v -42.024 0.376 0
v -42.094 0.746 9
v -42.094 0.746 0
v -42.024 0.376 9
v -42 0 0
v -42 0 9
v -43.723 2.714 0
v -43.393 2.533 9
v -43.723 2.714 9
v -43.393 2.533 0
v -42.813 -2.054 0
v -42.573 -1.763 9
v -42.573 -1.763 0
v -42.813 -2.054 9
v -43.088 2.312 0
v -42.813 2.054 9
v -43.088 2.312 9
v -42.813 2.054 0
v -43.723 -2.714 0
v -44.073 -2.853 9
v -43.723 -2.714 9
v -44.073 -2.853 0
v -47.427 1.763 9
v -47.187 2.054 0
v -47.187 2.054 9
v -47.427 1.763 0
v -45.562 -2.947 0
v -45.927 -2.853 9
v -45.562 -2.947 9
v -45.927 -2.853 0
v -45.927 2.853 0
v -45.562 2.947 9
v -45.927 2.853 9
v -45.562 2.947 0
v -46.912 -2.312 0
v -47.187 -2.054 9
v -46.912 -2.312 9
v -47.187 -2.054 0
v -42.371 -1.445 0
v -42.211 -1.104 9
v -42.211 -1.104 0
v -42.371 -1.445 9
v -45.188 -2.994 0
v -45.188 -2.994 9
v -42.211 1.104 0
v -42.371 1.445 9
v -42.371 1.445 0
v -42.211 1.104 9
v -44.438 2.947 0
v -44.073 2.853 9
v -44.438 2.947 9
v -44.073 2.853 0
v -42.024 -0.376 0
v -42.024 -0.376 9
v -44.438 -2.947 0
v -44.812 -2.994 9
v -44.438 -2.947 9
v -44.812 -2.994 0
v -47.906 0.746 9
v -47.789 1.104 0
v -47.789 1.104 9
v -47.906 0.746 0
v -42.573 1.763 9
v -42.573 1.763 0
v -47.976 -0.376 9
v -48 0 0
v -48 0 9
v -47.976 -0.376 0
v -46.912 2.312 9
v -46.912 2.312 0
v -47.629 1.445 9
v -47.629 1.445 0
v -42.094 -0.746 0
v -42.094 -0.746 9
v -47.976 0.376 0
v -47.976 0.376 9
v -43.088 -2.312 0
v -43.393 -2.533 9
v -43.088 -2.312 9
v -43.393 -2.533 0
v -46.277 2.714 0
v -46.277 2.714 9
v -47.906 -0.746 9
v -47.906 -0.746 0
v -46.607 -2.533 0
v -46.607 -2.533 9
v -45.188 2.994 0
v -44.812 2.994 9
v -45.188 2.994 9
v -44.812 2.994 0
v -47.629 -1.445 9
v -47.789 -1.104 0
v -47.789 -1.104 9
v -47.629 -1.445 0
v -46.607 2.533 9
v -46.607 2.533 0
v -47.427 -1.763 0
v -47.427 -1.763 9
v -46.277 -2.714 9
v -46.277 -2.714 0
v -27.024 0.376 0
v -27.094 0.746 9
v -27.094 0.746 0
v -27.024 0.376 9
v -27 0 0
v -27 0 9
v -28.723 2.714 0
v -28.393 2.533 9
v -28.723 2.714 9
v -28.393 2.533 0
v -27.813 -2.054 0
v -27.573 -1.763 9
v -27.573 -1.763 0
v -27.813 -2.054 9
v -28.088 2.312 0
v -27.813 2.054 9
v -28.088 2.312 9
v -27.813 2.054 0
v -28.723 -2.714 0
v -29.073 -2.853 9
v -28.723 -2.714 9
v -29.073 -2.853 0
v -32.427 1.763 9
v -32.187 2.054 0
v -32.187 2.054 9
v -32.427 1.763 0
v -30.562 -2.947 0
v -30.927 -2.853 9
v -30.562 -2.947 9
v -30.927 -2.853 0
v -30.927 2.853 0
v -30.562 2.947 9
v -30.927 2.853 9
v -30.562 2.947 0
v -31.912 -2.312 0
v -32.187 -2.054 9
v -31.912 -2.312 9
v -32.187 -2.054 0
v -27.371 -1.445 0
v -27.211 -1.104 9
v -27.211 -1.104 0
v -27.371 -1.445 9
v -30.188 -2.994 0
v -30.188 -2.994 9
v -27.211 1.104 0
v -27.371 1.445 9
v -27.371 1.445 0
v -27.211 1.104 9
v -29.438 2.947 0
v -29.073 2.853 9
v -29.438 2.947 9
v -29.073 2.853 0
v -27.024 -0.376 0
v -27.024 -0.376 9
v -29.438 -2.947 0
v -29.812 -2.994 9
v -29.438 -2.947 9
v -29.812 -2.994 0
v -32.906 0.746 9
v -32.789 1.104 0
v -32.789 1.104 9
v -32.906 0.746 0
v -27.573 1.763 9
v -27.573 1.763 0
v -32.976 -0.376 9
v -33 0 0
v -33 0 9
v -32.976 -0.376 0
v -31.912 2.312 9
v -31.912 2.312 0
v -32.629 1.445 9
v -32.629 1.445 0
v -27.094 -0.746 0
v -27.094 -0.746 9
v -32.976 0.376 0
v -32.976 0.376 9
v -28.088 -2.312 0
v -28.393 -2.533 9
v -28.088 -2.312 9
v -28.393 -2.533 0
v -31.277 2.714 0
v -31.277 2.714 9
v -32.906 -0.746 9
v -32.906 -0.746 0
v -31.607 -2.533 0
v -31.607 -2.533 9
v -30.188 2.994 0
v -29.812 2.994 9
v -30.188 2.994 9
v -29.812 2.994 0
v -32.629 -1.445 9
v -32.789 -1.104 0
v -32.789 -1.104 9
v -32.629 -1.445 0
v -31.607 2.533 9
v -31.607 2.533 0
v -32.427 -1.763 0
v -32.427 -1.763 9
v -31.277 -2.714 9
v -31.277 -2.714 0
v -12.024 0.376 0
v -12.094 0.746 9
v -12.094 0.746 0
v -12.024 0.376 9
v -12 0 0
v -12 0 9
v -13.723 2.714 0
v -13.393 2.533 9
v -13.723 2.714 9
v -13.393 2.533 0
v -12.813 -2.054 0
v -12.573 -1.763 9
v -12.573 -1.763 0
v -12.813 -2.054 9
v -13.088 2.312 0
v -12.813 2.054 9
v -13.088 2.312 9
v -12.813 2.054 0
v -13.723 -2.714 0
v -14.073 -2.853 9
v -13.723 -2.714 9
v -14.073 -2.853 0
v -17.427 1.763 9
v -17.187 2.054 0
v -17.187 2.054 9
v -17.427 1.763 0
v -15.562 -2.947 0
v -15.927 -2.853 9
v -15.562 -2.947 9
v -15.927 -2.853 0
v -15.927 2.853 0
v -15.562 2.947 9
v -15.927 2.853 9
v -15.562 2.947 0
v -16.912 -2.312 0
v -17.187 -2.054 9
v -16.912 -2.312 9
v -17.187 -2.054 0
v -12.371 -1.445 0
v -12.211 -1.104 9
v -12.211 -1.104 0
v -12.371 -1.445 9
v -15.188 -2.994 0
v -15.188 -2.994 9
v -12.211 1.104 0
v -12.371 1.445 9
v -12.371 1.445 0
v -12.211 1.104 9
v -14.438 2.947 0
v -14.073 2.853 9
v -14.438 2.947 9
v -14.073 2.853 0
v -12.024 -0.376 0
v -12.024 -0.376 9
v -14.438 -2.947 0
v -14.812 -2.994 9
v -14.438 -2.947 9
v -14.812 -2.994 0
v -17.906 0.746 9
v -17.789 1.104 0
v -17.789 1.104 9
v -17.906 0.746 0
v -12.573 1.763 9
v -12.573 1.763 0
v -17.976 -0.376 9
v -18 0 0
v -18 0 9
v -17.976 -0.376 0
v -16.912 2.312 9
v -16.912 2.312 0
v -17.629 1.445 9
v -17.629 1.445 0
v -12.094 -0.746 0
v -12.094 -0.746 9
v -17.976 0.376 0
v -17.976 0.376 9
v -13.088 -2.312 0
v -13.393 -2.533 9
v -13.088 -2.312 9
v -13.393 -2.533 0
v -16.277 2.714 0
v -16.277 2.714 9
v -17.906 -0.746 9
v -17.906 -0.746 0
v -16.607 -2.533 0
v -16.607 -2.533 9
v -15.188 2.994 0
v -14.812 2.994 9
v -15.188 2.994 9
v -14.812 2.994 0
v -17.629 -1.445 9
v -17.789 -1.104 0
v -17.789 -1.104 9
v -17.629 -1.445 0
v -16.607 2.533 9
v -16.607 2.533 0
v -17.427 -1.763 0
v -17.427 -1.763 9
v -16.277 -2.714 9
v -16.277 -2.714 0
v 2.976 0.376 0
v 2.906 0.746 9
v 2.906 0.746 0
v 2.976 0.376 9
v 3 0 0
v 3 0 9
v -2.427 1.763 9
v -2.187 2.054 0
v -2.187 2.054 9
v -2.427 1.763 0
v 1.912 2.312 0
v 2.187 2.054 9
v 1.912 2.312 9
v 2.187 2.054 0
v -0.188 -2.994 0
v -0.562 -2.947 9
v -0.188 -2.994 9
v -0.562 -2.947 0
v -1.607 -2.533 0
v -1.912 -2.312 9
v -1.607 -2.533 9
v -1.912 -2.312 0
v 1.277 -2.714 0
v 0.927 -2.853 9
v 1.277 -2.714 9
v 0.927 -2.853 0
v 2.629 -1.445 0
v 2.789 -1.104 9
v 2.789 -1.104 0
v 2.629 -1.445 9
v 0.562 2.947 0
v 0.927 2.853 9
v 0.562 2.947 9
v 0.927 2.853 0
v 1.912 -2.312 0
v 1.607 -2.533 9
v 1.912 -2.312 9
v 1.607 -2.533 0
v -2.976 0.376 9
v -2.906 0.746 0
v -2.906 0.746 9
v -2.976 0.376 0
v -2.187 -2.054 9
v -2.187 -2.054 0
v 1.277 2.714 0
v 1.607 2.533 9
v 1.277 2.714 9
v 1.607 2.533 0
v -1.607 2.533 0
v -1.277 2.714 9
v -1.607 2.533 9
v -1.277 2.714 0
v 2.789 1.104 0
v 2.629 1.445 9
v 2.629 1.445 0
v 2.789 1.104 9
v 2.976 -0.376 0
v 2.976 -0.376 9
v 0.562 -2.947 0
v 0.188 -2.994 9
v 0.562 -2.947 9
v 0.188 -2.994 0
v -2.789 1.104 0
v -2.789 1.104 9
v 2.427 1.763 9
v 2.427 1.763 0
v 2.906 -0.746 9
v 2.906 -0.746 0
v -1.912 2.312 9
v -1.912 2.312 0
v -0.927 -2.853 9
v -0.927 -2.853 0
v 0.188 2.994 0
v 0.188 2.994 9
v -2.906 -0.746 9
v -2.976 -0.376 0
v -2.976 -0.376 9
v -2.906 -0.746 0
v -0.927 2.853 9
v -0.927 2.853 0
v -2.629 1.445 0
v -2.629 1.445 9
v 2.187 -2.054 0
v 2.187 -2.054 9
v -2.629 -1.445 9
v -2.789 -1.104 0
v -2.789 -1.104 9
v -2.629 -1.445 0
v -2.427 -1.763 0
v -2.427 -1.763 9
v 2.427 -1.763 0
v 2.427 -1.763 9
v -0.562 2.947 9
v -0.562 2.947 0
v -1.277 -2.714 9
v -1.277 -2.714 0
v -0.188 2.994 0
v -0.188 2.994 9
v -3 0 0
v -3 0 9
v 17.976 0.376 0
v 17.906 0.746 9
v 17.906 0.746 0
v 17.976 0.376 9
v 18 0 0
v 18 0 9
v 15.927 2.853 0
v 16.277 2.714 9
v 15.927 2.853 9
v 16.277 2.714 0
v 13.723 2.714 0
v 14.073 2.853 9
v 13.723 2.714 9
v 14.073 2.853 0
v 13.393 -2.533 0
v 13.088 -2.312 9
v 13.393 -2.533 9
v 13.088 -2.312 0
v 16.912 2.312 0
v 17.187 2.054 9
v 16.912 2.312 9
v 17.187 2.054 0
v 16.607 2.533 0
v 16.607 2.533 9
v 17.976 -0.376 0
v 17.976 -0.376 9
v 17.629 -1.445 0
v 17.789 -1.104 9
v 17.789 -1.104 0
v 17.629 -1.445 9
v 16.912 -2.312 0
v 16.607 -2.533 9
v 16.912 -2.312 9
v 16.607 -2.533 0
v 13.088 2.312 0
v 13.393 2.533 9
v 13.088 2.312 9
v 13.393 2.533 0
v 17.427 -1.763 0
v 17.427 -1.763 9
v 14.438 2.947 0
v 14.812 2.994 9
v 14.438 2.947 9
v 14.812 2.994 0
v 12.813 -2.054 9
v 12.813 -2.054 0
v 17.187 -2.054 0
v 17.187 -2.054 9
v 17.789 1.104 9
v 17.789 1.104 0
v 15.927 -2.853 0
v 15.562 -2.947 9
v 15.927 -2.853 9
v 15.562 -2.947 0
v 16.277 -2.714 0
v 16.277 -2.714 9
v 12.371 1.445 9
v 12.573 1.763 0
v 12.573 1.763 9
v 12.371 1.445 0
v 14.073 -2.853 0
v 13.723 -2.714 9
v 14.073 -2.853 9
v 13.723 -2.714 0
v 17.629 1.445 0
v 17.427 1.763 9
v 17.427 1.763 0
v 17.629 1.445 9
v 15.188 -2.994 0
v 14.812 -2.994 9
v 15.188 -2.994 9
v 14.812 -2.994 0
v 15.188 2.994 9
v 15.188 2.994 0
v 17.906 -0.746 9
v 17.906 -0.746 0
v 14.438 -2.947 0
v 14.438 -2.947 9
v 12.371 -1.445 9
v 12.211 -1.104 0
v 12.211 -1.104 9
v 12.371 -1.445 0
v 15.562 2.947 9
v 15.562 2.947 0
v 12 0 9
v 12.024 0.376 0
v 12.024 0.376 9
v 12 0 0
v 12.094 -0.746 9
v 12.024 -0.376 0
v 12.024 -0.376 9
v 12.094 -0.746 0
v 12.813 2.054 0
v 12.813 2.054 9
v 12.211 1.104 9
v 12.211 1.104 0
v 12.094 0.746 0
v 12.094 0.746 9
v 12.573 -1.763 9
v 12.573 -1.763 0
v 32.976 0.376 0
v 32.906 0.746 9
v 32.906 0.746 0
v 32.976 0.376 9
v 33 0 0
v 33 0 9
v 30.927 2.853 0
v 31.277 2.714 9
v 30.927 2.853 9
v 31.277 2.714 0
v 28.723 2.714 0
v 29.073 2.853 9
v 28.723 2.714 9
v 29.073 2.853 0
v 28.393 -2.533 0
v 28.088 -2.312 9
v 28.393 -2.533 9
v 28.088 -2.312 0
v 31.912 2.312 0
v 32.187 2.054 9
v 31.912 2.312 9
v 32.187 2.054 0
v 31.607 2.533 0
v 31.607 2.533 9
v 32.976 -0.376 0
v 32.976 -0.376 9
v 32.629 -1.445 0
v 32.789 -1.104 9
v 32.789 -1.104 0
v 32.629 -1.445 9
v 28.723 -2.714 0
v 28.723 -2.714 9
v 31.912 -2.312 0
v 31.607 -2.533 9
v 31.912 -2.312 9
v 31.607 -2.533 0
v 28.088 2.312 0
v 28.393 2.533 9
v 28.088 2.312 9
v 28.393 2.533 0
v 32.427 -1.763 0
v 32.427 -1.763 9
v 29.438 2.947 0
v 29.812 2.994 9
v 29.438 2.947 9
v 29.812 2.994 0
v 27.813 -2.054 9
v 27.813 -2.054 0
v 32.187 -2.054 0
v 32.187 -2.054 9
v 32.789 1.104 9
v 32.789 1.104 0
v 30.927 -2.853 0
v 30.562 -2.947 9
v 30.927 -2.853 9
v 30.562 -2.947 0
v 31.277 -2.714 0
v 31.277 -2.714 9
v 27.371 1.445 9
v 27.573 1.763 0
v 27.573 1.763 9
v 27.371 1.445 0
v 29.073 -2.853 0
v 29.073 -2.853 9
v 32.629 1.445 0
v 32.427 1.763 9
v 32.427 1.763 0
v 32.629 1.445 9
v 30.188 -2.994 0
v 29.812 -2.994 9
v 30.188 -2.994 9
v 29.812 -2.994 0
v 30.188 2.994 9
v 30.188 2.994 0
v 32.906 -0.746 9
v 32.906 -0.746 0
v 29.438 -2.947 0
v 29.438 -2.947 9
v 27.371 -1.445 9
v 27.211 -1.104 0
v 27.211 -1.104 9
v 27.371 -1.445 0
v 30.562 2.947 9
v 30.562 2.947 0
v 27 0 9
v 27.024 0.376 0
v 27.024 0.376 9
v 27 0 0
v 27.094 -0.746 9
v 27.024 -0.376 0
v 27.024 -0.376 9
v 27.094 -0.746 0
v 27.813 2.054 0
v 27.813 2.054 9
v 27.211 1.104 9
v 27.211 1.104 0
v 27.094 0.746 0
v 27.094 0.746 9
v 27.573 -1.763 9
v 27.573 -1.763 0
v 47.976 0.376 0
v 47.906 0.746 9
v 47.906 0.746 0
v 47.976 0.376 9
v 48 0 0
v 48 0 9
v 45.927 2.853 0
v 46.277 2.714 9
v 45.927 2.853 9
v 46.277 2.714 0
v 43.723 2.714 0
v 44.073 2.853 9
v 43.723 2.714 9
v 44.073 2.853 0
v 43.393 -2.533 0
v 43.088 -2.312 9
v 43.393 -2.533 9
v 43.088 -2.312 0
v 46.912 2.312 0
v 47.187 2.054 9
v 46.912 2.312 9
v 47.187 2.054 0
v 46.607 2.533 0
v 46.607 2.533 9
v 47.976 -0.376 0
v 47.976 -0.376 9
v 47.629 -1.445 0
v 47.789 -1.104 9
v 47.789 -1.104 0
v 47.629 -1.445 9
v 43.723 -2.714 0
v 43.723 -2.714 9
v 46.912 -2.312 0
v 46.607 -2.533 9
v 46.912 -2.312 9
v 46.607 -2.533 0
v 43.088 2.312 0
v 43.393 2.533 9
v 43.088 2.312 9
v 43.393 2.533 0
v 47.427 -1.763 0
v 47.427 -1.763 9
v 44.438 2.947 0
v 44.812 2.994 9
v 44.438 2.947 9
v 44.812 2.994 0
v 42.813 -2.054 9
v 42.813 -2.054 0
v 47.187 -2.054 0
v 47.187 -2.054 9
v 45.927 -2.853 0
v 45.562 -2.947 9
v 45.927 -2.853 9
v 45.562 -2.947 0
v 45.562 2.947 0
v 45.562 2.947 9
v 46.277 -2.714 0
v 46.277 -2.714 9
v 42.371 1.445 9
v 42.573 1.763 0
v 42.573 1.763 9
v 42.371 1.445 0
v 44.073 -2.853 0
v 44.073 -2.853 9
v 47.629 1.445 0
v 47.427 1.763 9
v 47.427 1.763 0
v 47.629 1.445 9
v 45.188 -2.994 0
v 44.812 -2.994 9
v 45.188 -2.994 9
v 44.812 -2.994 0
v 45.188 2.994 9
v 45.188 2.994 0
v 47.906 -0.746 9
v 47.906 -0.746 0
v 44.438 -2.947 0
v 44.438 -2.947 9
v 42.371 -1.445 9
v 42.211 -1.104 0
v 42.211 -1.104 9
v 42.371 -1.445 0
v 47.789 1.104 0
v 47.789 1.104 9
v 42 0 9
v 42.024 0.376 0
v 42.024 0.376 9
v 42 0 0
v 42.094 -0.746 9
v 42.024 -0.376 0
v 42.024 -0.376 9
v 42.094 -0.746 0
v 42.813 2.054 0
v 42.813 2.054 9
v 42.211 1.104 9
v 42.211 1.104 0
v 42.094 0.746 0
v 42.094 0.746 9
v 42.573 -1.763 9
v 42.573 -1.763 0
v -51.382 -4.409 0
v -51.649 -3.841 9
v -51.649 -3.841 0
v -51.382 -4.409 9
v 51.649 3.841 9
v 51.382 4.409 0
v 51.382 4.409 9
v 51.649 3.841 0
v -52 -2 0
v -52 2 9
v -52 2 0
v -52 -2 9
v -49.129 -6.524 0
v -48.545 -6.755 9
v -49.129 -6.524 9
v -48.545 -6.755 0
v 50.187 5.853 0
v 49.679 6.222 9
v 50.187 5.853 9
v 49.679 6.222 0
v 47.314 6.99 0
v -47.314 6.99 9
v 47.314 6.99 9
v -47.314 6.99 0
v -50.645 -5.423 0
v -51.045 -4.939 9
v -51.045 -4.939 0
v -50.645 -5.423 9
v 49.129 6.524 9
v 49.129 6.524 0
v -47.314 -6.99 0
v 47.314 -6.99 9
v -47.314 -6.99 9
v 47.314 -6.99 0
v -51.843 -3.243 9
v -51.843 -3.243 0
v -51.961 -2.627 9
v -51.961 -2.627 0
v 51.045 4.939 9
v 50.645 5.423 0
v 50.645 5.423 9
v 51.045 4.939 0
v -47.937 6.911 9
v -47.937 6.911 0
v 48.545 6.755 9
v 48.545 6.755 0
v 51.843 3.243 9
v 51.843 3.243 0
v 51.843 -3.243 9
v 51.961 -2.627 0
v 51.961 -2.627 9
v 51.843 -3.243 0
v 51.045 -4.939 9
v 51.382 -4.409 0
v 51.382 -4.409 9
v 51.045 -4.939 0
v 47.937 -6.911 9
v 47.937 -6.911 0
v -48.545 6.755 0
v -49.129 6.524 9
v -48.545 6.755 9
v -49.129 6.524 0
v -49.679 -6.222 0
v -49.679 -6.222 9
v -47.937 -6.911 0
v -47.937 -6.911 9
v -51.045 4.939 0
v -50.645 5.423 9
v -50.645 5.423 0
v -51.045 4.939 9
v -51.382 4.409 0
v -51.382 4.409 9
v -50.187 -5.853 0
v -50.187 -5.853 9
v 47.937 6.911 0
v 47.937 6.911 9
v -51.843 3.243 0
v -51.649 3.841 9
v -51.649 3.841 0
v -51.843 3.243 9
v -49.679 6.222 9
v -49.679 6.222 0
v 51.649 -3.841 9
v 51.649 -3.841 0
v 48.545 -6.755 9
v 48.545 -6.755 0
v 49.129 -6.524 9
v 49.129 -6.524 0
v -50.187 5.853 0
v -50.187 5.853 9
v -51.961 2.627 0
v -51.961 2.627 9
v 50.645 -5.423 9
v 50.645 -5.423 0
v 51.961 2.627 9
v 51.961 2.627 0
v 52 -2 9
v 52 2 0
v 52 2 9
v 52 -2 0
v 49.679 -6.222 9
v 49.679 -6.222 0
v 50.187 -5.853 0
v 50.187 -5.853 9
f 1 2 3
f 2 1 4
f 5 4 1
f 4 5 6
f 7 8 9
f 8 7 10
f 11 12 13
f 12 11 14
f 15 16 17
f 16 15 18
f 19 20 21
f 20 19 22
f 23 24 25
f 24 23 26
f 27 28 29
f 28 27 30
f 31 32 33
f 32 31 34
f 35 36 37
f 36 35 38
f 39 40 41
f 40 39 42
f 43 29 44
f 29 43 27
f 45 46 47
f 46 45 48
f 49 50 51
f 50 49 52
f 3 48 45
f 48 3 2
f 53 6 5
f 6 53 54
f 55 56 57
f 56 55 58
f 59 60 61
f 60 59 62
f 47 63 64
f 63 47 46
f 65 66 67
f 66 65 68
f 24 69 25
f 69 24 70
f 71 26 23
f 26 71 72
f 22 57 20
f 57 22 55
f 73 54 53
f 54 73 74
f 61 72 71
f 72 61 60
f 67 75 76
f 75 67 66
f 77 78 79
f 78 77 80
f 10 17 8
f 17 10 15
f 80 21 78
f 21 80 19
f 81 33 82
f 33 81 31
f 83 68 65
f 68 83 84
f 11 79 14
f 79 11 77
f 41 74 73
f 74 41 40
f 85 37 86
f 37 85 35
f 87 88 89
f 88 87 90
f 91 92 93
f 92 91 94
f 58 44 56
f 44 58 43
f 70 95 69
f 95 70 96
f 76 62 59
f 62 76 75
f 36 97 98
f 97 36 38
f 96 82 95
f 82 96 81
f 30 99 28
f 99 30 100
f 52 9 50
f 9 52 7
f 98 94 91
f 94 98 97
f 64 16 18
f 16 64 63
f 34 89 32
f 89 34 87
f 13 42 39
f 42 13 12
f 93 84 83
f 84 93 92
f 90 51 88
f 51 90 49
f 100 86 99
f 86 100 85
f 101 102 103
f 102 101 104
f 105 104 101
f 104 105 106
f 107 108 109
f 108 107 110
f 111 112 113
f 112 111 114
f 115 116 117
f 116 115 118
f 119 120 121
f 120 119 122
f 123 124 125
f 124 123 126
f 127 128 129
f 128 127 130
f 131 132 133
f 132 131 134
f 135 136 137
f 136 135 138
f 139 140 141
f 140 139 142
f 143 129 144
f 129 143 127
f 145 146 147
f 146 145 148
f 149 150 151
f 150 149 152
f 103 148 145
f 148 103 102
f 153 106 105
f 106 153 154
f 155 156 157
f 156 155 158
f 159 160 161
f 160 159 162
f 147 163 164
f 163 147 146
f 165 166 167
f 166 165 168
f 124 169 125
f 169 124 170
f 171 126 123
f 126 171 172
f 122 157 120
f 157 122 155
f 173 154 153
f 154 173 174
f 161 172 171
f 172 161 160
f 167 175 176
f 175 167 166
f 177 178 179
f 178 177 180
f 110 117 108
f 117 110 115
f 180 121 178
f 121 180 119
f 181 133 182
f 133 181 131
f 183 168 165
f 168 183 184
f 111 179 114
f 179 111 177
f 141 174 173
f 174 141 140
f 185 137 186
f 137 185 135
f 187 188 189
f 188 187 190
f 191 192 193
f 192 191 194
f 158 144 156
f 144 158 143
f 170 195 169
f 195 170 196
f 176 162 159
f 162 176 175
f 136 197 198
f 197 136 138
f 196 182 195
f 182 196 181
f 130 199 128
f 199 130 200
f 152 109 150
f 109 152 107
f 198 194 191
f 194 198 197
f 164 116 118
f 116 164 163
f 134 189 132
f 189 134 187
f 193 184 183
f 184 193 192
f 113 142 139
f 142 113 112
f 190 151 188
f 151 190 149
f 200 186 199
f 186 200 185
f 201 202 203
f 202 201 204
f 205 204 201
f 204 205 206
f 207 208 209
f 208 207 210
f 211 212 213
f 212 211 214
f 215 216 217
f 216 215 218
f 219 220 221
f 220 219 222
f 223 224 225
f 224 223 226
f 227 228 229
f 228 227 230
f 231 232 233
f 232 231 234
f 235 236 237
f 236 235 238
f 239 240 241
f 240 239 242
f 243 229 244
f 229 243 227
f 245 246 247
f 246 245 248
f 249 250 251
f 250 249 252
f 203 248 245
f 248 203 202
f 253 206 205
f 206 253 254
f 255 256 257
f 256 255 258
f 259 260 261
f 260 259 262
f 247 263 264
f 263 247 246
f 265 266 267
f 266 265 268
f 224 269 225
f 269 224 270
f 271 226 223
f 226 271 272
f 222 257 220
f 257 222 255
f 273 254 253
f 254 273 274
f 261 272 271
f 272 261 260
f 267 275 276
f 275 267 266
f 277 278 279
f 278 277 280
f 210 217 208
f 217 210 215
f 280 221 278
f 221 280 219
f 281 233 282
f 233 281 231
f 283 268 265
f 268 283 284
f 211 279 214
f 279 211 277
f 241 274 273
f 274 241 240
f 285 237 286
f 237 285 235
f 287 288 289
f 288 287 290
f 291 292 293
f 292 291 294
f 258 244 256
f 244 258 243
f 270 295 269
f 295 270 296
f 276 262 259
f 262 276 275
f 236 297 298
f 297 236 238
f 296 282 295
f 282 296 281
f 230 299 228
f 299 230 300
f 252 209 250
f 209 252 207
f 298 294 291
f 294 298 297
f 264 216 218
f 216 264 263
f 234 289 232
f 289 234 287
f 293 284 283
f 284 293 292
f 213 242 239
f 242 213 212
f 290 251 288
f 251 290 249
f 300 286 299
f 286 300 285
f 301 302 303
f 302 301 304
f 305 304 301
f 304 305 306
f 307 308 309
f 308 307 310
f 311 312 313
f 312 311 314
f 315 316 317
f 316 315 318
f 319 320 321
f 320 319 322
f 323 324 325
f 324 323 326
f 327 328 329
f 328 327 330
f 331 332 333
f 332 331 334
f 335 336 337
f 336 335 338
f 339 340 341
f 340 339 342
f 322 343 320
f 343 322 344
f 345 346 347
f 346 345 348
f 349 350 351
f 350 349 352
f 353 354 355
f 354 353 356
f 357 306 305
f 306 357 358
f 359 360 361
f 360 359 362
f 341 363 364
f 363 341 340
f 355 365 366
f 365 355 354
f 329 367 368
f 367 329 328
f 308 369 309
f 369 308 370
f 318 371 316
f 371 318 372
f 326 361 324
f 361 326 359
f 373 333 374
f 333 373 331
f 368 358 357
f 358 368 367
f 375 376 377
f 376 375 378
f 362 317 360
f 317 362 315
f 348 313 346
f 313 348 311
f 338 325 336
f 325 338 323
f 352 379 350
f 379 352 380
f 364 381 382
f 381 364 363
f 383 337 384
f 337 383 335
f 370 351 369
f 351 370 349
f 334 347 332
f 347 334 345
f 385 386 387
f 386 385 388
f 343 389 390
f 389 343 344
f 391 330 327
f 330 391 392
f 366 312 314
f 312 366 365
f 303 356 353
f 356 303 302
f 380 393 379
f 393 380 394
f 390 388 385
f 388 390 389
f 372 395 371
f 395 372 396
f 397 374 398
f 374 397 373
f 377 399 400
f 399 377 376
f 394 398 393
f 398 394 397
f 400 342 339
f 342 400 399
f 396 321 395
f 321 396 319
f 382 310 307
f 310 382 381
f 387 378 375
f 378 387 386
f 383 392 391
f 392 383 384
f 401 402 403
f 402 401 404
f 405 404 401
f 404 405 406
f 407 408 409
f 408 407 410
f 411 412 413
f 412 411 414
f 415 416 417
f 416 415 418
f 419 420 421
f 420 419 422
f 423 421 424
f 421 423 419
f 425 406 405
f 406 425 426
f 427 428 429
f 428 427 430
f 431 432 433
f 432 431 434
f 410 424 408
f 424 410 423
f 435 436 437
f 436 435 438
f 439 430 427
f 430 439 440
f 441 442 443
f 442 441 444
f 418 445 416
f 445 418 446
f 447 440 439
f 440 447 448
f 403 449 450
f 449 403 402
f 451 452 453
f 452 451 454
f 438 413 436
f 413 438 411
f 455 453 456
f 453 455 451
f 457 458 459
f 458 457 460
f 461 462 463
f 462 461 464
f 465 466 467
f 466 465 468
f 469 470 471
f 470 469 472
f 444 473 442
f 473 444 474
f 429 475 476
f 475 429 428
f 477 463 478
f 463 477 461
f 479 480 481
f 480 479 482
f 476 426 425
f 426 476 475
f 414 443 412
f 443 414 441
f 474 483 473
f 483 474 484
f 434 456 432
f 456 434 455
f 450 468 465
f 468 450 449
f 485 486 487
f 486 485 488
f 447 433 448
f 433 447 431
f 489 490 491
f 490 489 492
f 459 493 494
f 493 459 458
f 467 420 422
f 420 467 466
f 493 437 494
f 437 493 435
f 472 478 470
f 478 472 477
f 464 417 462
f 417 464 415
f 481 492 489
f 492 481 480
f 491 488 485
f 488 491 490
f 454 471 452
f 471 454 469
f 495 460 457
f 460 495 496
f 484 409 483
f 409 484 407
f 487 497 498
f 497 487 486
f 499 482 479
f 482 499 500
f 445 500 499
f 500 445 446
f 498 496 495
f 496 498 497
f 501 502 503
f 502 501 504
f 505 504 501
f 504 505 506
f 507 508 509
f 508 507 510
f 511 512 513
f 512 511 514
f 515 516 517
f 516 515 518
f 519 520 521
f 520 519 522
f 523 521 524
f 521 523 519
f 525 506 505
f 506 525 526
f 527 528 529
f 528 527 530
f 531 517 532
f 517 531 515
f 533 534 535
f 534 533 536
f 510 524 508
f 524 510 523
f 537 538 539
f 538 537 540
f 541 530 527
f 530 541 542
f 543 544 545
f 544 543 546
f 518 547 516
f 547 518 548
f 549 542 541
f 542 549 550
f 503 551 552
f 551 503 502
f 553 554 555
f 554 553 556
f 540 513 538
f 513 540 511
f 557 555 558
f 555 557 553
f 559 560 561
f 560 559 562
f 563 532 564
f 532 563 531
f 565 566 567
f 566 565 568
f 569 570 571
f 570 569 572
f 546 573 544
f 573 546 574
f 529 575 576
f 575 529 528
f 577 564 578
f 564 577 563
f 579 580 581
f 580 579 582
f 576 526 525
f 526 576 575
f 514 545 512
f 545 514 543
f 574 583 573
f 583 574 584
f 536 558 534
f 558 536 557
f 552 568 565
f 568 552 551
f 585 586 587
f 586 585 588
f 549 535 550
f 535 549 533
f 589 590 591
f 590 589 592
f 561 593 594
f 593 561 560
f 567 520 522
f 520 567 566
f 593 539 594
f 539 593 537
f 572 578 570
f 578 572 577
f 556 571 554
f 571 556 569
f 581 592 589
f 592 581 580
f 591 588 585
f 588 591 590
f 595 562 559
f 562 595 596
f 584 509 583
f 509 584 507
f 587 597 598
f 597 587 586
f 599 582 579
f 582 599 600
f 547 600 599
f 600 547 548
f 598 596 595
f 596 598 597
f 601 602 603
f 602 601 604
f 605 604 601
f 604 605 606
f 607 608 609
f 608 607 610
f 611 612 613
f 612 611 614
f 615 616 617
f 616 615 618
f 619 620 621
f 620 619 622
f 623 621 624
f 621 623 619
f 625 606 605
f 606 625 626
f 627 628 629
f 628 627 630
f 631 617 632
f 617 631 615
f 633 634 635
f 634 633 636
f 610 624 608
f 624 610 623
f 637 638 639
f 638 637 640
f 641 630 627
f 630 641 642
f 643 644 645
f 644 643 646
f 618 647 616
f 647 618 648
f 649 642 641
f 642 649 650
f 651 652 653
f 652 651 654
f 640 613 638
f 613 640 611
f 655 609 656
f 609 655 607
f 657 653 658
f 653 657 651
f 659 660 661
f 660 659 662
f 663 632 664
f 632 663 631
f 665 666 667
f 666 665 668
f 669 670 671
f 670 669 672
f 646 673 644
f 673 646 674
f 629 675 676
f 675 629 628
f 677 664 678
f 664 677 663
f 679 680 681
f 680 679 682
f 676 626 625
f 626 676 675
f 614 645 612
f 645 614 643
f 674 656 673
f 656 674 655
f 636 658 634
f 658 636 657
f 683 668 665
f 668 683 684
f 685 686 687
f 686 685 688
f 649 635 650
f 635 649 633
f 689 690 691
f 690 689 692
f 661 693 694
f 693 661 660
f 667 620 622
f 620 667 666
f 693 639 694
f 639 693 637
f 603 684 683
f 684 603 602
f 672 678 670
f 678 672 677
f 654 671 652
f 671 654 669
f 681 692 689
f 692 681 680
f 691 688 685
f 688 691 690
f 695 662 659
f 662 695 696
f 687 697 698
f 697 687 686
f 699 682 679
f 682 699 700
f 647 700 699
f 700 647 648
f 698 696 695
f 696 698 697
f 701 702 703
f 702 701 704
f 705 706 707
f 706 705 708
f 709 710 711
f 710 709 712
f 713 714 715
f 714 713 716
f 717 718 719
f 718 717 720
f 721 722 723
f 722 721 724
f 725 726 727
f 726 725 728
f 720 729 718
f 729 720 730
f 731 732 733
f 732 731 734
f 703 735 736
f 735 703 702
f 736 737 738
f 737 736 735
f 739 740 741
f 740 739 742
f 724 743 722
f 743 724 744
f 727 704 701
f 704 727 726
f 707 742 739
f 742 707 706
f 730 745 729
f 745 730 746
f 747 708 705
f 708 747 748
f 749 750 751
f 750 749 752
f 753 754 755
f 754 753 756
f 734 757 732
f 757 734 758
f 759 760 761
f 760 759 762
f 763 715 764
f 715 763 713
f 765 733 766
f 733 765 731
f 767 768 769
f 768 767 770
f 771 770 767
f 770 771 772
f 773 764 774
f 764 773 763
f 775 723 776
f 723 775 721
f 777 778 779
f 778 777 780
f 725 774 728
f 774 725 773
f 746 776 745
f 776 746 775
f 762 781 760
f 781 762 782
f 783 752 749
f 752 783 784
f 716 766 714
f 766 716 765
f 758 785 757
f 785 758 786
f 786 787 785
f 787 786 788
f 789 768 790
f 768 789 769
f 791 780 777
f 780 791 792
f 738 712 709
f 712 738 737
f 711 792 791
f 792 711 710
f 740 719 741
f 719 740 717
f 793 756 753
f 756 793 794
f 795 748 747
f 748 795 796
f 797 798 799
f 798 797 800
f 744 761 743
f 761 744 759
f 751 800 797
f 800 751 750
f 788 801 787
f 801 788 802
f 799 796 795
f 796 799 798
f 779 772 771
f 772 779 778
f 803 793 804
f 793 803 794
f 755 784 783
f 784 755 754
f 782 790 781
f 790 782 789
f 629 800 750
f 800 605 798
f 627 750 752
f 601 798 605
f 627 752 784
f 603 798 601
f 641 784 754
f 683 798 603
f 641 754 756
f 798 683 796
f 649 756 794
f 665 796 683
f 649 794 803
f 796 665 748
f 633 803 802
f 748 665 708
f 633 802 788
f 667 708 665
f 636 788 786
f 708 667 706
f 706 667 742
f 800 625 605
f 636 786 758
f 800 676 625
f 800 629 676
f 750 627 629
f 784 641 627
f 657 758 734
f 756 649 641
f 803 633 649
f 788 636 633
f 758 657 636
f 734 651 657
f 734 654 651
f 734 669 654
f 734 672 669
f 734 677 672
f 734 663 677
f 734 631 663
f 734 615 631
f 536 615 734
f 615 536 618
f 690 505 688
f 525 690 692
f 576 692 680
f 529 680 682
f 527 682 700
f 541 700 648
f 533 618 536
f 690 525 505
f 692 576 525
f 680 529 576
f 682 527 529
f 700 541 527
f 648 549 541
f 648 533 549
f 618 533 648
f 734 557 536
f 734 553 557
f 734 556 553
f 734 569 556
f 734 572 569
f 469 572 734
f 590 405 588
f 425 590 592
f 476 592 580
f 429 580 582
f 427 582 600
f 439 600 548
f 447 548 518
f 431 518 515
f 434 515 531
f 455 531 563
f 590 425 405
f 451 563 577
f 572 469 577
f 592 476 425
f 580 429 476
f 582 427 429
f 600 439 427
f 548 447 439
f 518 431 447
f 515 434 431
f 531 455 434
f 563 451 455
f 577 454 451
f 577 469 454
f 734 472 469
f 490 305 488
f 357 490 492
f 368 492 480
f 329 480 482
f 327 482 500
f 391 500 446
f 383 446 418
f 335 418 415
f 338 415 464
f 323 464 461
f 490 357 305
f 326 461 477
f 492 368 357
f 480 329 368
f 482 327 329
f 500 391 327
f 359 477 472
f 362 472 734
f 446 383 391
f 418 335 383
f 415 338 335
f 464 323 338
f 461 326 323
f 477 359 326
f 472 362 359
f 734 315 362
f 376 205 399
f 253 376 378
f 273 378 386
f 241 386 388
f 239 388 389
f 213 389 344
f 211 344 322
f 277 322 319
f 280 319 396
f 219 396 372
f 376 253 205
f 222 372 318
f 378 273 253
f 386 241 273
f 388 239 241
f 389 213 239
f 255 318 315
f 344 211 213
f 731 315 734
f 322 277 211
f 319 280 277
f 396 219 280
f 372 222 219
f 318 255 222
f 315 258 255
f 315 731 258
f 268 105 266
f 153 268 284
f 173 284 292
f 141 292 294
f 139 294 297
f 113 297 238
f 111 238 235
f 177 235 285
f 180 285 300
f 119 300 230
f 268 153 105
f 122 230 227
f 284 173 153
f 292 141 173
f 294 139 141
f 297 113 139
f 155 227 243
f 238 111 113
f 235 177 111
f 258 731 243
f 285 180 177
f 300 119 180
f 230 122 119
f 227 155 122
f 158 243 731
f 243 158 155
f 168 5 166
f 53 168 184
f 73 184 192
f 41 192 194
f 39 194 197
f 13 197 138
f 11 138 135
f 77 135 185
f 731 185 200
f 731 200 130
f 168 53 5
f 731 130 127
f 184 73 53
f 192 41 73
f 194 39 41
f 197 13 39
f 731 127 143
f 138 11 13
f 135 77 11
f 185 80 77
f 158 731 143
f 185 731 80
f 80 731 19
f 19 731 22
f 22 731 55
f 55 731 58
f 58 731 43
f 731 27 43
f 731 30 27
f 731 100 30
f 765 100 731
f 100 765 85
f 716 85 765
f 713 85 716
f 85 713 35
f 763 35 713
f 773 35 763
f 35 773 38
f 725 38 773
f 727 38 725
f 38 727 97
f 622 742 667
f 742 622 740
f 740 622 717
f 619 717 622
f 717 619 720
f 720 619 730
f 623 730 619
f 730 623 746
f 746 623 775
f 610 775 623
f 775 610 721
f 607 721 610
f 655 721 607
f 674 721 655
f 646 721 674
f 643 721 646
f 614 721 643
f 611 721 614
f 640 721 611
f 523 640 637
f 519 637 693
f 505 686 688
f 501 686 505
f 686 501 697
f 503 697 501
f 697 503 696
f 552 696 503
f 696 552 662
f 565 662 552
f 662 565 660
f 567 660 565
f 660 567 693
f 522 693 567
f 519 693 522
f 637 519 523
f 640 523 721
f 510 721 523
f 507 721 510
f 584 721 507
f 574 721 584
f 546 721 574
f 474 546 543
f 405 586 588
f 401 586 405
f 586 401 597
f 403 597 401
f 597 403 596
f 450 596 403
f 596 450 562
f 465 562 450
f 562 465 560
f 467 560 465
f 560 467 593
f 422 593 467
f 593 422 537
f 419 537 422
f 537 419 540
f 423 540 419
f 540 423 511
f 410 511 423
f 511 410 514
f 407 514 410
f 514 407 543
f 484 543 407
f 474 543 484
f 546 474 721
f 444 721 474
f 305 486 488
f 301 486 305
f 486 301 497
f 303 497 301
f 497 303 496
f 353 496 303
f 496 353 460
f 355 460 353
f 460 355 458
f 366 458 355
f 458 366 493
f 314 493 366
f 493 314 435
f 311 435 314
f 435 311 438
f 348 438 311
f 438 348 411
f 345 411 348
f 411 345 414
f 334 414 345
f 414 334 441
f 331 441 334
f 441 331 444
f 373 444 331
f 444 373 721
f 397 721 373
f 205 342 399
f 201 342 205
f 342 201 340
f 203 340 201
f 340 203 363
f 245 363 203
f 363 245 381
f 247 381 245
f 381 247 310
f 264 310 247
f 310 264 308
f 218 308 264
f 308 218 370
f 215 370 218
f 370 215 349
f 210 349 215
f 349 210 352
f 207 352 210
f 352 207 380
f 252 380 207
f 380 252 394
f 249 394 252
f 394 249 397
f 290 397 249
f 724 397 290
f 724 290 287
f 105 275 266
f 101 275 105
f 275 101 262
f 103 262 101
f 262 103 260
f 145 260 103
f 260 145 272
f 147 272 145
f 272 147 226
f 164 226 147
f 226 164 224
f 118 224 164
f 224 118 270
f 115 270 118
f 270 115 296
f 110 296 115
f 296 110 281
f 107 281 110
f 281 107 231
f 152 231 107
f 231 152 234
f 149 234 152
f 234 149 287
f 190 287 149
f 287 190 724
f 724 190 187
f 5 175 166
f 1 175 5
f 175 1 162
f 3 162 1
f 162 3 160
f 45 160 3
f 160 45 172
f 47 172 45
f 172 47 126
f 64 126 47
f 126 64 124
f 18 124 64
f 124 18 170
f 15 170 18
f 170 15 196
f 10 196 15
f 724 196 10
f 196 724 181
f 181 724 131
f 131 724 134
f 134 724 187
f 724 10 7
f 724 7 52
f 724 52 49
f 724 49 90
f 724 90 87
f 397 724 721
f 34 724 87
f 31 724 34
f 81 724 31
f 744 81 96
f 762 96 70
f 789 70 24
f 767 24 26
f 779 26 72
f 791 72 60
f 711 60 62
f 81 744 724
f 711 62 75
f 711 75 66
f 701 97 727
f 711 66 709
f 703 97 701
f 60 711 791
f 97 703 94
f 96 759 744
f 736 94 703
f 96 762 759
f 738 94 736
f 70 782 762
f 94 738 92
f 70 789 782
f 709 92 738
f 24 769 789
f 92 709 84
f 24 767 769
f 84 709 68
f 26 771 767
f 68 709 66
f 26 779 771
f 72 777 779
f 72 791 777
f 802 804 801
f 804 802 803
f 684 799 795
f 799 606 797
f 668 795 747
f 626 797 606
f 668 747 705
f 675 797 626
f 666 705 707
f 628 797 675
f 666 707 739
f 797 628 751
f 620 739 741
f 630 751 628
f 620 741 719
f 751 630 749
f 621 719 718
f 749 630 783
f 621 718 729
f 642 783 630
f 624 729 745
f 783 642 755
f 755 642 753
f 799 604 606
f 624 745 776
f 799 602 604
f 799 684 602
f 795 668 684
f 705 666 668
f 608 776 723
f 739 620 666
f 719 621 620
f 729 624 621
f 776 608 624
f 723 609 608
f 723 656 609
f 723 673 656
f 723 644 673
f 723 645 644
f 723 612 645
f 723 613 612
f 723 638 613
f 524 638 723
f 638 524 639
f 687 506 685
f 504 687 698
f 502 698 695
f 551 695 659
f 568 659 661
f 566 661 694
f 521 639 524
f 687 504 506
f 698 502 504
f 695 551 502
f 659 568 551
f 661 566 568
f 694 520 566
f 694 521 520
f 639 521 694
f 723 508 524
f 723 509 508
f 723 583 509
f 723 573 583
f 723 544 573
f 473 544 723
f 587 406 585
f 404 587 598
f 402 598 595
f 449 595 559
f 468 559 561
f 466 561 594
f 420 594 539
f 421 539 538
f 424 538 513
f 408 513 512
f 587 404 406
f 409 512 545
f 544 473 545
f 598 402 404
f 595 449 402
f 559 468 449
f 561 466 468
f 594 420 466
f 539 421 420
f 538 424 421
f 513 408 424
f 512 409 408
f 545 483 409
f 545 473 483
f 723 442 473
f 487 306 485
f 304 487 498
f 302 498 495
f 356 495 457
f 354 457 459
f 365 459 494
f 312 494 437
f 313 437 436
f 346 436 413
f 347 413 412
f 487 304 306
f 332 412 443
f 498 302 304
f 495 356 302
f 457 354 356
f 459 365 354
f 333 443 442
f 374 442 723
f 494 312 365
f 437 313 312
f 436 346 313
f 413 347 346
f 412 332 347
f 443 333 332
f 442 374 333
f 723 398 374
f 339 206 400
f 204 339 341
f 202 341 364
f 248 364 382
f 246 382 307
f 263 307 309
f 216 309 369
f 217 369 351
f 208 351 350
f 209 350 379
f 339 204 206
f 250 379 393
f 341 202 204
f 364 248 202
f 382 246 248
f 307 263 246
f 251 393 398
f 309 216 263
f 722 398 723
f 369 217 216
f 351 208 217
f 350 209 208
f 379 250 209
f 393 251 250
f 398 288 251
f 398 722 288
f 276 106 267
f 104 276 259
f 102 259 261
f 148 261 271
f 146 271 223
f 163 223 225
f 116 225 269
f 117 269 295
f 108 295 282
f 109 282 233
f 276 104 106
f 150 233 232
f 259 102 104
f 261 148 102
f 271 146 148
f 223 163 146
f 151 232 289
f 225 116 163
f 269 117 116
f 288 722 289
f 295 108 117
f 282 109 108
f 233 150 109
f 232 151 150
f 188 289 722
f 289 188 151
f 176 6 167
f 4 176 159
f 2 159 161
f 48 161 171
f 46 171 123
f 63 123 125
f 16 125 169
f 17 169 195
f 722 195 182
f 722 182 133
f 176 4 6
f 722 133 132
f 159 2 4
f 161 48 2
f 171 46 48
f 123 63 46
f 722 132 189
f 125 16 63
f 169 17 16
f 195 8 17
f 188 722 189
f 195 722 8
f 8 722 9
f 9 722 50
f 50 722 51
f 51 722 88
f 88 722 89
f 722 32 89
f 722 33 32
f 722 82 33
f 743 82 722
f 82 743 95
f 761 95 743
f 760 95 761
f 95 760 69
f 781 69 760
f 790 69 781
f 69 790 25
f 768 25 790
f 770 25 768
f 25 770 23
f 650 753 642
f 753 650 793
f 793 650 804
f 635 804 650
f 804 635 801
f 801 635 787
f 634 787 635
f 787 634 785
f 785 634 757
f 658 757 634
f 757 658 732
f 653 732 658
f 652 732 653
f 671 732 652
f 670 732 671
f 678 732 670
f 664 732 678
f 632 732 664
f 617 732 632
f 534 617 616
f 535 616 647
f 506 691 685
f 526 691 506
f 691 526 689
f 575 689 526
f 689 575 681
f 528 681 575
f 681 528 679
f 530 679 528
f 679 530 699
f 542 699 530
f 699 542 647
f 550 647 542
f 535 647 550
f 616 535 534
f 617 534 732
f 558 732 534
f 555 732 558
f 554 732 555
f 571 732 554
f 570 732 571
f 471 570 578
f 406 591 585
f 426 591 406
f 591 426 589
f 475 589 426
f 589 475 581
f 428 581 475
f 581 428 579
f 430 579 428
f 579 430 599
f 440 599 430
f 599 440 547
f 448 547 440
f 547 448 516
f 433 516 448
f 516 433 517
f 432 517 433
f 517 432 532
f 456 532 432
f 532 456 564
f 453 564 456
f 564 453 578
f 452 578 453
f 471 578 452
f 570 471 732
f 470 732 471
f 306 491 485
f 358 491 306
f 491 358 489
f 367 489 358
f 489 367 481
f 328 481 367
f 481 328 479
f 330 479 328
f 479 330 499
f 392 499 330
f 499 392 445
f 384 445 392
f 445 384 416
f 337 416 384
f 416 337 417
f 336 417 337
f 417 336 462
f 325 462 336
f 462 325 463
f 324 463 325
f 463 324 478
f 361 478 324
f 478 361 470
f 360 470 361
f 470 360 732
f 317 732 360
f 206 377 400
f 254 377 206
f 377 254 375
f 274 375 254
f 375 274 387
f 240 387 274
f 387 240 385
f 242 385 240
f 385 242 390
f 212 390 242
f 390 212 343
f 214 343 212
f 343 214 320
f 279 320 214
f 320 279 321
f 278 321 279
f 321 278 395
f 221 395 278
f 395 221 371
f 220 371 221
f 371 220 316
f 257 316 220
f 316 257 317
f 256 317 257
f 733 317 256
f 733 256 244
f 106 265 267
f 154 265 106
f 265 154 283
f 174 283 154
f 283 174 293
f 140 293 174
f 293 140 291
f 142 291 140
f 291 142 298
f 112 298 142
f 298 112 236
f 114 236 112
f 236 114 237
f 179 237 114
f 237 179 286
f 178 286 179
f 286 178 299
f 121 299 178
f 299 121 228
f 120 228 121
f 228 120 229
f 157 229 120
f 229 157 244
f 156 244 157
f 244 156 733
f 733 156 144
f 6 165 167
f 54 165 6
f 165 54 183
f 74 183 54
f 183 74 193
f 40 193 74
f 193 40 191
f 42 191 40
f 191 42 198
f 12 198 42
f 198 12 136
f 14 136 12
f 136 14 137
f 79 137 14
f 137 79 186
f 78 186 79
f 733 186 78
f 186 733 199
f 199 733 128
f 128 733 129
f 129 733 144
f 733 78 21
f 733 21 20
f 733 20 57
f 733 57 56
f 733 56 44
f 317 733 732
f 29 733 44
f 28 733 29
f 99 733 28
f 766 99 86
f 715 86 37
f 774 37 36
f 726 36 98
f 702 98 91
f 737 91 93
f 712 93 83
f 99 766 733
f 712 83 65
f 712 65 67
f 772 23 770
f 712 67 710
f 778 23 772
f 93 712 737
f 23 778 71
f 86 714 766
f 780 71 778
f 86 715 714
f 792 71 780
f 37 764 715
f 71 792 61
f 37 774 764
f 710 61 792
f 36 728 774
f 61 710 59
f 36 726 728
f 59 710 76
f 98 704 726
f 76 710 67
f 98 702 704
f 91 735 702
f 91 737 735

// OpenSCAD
$fn = 50;


difference() {
	union() {
		hull() {
			translate(v = [-47.0000000000, 2.0000000000, 0]) {
				cylinder(h = 9, r = 5);
			}
			translate(v = [47.0000000000, 2.0000000000, 0]) {
				cylinder(h = 9, r = 5);
			}
			translate(v = [-47.0000000000, -2.0000000000, 0]) {
				cylinder(h = 9, r = 5);
			}
			translate(v = [47.0000000000, -2.0000000000, 0]) {
				cylinder(h = 9, r = 5);
			}
		}
	}
	union() {
		translate(v = [-45.0000000000, 0.0000000000, 0]) {
			translate(v = [0, 0, -100]) {
				cylinder(h = 200, r = 3.0000000000);
			}
		}
		translate(v = [-30.0000000000, 0.0000000000, 0]) {
			translate(v = [0, 0, -100]) {
				cylinder(h = 200, r = 3.0000000000);
			}
		}
		translate(v = [-15.0000000000, 0.0000000000, 0]) {
			translate(v = [0, 0, -100]) {
				cylinder(h = 200, r = 3.0000000000);
			}
		}
		translate(v = [0, 0, -100]) {
			cylinder(h = 200, r = 3.0000000000);
		}
		translate(v = [15.0000000000, 0.0000000000, 0]) {
			translate(v = [0, 0, -100]) {
				cylinder(h = 200, r = 3.0000000000);
			}
		}
		translate(v = [30.0000000000, 0.0000000000, 0]) {
			translate(v = [0, 0, -100]) {
				cylinder(h = 200, r = 3.0000000000);
			}
		}
		translate(v = [45.0000000000, 0.0000000000, 0]) {
			translate(v = [0, 0, -100]) {
				cylinder(h = 200, r = 3.0000000000);
			}
		}
	}
}
